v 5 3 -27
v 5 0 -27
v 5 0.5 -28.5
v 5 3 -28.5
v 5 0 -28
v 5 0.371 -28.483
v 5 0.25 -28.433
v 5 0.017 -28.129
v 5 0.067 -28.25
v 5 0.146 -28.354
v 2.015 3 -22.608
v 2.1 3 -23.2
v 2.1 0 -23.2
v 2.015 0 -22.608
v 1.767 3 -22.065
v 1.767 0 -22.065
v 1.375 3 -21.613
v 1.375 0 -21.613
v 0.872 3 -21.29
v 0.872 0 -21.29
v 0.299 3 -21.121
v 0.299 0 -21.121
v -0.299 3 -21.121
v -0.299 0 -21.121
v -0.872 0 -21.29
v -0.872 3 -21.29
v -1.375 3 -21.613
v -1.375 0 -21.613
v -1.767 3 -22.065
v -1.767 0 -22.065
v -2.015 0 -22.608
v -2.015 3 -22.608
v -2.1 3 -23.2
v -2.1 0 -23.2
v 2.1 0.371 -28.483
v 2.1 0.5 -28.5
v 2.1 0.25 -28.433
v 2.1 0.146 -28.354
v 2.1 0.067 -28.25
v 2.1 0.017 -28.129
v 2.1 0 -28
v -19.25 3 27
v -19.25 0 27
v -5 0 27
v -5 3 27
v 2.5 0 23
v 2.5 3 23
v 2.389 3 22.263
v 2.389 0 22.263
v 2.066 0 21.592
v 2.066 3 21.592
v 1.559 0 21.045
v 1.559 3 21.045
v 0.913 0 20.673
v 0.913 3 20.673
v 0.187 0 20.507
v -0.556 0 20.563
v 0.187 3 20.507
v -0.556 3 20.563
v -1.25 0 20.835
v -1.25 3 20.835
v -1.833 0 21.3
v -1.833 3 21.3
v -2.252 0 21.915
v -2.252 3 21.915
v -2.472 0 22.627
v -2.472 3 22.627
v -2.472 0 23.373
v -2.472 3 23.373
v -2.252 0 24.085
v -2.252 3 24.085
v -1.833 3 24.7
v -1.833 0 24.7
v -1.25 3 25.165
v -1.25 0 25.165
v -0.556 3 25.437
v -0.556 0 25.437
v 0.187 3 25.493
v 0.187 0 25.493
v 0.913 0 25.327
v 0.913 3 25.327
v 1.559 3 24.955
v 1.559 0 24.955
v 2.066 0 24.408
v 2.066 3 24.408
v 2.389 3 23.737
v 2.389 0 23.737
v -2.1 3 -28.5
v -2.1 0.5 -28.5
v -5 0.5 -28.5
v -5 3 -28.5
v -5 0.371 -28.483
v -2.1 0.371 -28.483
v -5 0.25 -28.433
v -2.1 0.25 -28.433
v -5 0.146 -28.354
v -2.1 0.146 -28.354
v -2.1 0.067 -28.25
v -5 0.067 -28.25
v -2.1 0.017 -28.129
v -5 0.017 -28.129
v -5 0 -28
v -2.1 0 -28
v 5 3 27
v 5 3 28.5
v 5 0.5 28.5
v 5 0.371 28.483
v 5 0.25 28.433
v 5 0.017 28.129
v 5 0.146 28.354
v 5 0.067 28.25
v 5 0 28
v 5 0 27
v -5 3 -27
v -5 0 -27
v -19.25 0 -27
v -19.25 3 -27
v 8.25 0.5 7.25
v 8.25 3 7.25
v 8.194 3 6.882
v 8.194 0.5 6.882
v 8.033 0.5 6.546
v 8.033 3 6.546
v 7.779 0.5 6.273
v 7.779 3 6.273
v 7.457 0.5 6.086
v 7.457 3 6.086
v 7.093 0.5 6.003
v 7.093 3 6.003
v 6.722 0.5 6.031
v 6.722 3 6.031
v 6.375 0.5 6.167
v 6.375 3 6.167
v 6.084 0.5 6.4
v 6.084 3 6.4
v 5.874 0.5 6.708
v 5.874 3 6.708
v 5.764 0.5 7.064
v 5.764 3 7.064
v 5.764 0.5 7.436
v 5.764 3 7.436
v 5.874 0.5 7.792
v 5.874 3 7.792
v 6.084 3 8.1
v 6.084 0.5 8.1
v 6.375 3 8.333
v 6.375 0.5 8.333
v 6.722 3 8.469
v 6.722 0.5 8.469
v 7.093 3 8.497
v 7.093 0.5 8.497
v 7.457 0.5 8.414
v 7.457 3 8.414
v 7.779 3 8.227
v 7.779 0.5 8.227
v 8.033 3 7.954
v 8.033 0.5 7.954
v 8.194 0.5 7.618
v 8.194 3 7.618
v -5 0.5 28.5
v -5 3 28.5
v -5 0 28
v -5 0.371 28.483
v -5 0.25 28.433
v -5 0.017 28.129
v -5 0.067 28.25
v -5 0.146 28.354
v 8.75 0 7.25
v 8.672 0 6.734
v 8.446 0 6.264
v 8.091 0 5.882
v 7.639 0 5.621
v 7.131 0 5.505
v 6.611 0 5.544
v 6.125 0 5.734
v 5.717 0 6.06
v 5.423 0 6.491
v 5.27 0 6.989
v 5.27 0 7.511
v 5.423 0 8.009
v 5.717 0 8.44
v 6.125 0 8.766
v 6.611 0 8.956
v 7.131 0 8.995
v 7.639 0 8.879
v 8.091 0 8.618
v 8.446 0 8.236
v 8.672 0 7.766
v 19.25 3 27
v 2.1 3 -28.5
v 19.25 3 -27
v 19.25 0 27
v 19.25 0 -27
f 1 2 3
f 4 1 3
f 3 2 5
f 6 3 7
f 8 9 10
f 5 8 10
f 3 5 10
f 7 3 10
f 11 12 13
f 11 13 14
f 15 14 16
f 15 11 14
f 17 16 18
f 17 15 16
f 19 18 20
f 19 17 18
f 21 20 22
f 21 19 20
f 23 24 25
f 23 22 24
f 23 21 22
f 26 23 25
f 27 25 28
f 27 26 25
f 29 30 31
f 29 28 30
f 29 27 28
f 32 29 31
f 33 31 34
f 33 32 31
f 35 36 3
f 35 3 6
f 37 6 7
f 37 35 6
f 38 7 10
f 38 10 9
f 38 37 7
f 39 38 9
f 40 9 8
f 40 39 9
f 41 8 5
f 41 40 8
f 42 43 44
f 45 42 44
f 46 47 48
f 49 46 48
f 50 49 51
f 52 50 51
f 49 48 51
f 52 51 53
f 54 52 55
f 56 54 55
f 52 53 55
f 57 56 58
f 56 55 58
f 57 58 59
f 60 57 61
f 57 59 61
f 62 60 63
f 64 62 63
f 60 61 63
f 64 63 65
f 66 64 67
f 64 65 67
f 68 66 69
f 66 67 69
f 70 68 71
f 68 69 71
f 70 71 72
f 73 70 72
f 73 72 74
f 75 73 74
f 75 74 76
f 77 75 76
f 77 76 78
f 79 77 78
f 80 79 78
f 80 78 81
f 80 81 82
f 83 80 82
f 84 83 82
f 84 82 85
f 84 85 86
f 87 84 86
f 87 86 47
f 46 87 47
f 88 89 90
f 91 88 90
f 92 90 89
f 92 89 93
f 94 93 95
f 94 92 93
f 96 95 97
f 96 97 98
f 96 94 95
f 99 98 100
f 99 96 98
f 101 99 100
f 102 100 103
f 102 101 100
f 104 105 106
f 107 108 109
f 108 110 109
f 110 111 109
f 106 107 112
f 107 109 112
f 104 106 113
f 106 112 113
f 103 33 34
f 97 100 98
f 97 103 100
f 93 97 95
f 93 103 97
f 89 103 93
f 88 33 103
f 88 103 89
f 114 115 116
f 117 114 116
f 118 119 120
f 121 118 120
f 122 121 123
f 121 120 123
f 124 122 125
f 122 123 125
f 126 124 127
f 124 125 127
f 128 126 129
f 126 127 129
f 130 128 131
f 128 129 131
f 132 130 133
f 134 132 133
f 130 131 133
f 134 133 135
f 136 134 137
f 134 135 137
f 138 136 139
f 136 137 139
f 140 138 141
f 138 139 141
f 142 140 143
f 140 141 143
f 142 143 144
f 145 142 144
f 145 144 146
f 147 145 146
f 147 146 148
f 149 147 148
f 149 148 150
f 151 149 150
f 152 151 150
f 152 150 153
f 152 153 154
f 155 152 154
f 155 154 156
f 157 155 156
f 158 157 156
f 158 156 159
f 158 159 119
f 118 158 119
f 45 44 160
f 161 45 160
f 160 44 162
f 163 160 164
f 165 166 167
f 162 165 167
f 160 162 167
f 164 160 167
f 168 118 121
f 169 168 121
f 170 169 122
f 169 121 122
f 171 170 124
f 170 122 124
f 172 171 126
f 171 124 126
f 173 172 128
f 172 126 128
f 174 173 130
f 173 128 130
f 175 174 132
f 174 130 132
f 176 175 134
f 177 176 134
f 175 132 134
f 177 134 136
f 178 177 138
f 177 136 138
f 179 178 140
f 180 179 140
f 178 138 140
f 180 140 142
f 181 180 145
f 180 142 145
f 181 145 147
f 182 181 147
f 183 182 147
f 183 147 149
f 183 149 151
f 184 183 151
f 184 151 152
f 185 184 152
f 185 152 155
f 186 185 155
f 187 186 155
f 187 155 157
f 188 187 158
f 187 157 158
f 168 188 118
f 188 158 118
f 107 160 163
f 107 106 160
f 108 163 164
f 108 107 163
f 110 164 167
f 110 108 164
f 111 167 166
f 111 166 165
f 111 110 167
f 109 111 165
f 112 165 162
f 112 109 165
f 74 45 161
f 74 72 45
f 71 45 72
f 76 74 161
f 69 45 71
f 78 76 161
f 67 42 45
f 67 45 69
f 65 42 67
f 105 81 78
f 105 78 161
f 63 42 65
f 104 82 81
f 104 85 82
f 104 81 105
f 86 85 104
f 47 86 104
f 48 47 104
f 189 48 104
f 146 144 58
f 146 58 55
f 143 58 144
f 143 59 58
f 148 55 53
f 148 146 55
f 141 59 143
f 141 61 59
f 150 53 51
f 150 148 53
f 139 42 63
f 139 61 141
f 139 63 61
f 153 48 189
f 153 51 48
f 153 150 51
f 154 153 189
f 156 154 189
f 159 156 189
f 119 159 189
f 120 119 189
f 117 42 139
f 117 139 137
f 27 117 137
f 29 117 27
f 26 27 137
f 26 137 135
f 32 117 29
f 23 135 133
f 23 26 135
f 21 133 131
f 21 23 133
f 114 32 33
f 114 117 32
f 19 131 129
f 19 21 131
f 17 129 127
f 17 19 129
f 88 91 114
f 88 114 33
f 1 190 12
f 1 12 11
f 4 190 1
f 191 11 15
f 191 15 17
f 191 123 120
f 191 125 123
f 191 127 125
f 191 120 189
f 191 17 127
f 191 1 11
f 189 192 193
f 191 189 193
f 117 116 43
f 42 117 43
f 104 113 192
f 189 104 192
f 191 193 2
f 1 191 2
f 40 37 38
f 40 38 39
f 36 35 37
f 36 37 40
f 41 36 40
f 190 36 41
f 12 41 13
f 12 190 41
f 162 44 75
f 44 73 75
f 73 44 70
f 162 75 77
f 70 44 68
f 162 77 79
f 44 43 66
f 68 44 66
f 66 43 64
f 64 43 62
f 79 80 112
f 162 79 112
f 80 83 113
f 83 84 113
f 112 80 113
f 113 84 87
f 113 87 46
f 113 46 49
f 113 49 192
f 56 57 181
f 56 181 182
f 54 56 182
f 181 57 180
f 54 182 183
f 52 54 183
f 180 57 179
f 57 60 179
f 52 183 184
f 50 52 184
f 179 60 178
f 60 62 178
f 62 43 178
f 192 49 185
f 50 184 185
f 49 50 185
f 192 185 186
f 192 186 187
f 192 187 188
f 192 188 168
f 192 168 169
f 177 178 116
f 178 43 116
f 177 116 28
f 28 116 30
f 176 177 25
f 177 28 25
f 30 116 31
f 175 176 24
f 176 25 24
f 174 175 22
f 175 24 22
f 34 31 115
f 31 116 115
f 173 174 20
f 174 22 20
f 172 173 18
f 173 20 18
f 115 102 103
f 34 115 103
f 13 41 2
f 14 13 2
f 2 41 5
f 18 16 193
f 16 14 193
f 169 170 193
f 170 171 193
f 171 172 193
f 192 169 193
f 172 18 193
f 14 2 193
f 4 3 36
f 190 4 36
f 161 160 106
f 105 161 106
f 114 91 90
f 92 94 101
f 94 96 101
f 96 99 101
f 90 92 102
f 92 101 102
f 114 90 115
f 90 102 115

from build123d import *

# Parameters (mm, degrees)
BOSS_EXTRUDE1_DEPTH = 3
FILLET1_R           = 0.5
SKETCH2_R           = 2.5
CUT_EXTRUDE1_DEPTH  = 4
CUT_EXTRUDE2_DEPTH  = 4
SKETCH4_R           = 1.25
CUT_EXTRUDE3_DEPTH  = 4
CHAMFER1_SIZE       = 0.5


with BuildPart() as part:
    # Sketch1 → Boss-Extrude1 (new body)
    with BuildSketch(Plane(origin=(0, 0, 0), x_dir=(1, 0, 0), z_dir=(0, 1, 0))):
        Polygon((-19.25, 27), (-19.25, -27), (-5, -27), (-5, -28.5), (5, -28.5), (5, -27), (19.25, -27), (19.25, 27), (5, 27), (5, 28.5), (-5, 28.5), (-5, 27), align=None)
    extrude(amount=BOSS_EXTRUDE1_DEPTH)

    # Fillet1
    fillet1_edges = [part.edges().sort_by_distance(p)[0] for p in [
        (0, 0, 28.5),
        (0, 0, -28.5),
    ]]
    fillet(fillet1_edges, radius=FILLET1_R)

    # Sketch2 → Cut-Extrude1 (cut, through all)
    with BuildSketch(Plane(origin=(0, 3, 0), x_dir=(1, 0, 0), z_dir=(0, 1, 0))):
        with Locations((0, -23)):
            Circle(SKETCH2_R)
    extrude(amount=-CUT_EXTRUDE1_DEPTH, mode=Mode.SUBTRACT)

    # Sketch3 → Cut-Extrude2 (cut, through all)
    with BuildSketch(Plane(origin=(0, 3, 0), x_dir=(1, 0, 0), z_dir=(0, 1, 0))):
        with BuildLine():
            Line((-2.1, 28.5), (2.1, 28.5))
            Line((2.1, 28.5), (2.1, 23.2))
            ThreePointArc((2.1, 23.2), (0, 21.1), (-2.1, 23.2))
            Line((-2.1, 23.2), (-2.1, 28.5))
        make_face()
    extrude(amount=-CUT_EXTRUDE2_DEPTH, mode=Mode.SUBTRACT)

    # Sketch4 → Cut-Extrude3 (cut, through all)
    with BuildSketch(Plane(origin=(0, 3, 0), x_dir=(1, 0, 0), z_dir=(0, 1, 0))):
        with Locations((7, -7.25)):
            Circle(SKETCH4_R)
    extrude(amount=-CUT_EXTRUDE3_DEPTH, mode=Mode.SUBTRACT)

    # Chamfer1
    chamfer1_edges = [part.edges().sort_by_distance(p)[0] for p in [
        (5.75, 0, 7.25),
    ]]
    chamfer(chamfer1_edges, length=CHAMFER1_SIZE)


solid = part.part
